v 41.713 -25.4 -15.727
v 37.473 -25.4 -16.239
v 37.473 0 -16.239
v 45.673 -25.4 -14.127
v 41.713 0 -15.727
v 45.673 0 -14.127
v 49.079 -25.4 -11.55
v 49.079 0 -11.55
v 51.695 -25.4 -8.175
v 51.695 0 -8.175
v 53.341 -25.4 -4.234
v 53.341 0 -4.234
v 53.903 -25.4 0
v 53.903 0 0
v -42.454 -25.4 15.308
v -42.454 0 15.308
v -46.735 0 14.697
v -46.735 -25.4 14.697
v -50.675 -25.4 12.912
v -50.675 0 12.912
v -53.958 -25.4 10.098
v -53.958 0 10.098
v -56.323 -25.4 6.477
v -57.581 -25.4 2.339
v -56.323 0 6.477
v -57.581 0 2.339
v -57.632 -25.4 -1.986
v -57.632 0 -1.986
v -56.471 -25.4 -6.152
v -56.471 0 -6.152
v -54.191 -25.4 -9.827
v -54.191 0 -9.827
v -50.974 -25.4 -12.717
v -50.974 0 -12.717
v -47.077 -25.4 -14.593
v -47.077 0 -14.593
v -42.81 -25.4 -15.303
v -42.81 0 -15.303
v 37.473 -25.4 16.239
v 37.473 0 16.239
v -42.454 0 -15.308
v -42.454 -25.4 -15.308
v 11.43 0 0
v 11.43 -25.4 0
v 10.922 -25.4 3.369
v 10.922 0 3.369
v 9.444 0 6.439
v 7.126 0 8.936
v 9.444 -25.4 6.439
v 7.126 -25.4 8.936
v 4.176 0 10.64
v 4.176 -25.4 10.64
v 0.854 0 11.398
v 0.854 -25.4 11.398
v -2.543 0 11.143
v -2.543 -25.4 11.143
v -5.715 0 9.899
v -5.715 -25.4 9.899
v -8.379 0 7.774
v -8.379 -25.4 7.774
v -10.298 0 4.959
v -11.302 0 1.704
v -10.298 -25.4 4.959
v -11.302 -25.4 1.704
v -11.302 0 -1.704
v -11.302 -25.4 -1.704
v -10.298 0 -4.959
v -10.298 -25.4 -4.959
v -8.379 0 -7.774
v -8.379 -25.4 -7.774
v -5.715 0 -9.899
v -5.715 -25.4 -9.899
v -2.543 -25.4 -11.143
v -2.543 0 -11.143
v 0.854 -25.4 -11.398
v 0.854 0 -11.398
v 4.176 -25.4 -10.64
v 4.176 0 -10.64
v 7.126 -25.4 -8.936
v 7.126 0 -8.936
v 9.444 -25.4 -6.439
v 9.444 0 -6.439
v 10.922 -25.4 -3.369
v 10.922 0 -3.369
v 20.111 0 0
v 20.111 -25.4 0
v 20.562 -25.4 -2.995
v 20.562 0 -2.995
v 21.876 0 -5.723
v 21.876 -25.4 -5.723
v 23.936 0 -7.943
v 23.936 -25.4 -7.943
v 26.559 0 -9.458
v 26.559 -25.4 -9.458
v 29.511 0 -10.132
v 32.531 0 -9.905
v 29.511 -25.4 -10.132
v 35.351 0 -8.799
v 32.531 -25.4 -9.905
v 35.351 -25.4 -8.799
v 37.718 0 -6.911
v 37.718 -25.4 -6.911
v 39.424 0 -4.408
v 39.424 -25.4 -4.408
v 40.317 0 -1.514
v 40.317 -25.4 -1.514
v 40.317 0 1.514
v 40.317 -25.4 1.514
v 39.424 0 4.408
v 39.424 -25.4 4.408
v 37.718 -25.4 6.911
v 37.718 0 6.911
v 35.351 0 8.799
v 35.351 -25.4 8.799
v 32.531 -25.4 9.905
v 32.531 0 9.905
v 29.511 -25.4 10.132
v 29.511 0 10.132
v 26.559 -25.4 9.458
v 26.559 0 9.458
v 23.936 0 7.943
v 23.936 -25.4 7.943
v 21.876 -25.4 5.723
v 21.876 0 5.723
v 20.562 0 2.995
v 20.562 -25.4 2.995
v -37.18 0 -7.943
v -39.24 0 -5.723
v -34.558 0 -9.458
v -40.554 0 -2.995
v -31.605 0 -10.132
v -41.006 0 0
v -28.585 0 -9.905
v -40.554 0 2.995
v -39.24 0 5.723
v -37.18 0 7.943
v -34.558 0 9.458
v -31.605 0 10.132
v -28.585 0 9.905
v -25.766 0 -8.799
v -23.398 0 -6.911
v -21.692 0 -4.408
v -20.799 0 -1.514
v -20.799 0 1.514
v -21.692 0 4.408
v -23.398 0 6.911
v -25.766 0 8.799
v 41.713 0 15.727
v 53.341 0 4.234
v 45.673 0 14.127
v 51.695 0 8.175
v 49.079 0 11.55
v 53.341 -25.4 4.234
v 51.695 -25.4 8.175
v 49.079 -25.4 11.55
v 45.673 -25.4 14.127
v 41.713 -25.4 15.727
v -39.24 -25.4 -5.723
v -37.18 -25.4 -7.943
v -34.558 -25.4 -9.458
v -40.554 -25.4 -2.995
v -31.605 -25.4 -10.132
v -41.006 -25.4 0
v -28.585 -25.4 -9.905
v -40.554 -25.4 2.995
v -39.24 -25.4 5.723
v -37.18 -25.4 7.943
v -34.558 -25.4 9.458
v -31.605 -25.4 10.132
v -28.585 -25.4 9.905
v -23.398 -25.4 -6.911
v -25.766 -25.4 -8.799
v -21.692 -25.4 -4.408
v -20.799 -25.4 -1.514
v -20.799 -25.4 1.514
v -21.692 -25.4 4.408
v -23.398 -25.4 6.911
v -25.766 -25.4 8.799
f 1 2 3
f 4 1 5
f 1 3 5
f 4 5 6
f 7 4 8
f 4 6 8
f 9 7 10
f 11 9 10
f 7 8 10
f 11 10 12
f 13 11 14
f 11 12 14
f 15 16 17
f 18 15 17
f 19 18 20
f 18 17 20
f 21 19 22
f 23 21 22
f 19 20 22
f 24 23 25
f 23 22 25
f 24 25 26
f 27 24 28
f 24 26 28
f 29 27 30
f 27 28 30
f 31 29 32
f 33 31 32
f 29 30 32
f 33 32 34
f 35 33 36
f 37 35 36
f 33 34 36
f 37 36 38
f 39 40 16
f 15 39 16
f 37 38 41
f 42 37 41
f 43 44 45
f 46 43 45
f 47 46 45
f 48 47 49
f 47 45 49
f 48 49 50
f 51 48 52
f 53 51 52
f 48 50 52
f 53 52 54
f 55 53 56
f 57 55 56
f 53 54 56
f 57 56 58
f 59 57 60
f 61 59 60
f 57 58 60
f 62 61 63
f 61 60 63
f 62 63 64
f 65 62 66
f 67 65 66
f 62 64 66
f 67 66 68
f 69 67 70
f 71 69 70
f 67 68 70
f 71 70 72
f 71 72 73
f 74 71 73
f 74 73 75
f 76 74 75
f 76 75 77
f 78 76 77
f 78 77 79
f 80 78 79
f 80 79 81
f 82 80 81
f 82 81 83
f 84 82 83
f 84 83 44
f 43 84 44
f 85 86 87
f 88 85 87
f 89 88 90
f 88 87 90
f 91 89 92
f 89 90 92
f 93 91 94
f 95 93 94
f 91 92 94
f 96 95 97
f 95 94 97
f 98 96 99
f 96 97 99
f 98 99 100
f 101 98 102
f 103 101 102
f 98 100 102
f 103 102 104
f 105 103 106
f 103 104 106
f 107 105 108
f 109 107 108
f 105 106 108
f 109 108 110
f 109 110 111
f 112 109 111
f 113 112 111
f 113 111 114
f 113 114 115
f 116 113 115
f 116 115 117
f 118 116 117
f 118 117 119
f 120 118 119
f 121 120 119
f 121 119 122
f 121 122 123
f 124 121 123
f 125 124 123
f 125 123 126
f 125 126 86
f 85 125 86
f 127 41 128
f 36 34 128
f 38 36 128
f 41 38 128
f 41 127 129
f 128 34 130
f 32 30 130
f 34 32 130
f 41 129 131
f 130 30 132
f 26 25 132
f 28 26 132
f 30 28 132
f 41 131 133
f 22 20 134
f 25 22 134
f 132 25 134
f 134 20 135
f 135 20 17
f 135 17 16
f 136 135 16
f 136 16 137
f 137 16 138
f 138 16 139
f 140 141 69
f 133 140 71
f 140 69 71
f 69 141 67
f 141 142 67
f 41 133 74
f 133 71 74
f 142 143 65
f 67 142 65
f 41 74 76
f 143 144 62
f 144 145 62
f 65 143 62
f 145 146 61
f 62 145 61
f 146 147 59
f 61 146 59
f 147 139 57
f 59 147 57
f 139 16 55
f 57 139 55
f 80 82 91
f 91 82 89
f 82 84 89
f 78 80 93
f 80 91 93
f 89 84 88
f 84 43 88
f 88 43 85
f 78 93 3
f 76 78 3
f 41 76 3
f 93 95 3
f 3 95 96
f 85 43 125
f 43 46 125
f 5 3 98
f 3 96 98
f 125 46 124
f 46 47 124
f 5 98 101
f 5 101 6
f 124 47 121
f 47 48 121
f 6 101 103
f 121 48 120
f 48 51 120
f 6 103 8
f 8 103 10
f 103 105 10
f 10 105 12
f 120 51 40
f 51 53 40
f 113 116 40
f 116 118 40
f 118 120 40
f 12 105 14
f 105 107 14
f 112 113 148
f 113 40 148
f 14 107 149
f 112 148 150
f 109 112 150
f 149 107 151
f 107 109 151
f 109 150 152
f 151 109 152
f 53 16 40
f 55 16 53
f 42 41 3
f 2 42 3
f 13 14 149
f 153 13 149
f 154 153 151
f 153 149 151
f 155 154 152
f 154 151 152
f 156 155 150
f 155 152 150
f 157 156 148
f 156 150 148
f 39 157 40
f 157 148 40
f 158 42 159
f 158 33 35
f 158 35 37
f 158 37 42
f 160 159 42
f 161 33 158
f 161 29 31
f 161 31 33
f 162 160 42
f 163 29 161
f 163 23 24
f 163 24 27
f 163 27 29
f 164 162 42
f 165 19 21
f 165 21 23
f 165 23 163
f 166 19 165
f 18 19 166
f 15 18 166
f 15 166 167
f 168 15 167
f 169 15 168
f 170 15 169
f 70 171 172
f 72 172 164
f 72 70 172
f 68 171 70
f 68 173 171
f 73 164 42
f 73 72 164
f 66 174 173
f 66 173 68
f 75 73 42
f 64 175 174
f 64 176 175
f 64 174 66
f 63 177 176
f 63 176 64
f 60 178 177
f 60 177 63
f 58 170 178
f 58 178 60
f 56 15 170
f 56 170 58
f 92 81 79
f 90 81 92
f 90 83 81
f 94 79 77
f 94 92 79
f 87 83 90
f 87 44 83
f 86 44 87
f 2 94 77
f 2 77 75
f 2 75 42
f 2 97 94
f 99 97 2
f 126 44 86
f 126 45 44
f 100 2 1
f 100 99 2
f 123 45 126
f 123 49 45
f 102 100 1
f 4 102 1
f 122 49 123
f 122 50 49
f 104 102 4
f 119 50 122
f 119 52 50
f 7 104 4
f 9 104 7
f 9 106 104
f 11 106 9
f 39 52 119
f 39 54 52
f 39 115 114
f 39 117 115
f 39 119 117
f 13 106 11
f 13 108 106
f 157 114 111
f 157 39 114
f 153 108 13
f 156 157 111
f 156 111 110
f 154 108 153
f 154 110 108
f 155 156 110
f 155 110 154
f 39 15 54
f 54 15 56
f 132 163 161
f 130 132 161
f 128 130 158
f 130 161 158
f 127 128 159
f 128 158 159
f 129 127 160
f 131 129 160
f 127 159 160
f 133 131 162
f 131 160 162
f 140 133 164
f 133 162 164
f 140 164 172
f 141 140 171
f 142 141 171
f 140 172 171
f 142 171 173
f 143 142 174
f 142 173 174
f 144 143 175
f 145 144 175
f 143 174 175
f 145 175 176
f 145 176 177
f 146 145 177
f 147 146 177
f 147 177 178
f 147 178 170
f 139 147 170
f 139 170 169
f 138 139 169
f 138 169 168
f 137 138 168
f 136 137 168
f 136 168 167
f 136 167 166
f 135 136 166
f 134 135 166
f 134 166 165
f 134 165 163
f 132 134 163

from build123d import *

# Parameters (mm, degrees)
F1_DEPTH = 25.4
F3_D     = 20.32
F5_D     = 22.86


with BuildPart() as f1:
    # F0 (on Front) → F1 (new body)
    with BuildSketch(Plane.XZ):
        with BuildLine():
            Line((37.473018, -16.239311), (37.473018, 16.239311))
            ThreePointArc((37.473018, 16.239311), (21.421916, 0), (37.473018, -16.239311))
        make_face()
        with BuildLine():
            ThreePointArc((53.902746, 0), (49.07891, 11.550446), (37.473018, 16.239311))
            Line((37.473018, 16.239311), (37.473018, -16.239311))
            ThreePointArc((37.473018, -16.239311), (49.07891, -11.550446), (53.902746, 0))
        make_face()
        with BuildLine():
            ThreePointArc((-42.453576, 15.307551), (-31.629503, 10.824073), (-27.146025, 0))
            ThreePointArc((-27.146025, 0), (-31.629503, -10.824073), (-42.453576, -15.307551))
            Line((-42.453576, -15.307551), (37.473018, -16.239311))
            ThreePointArc((37.473018, -16.239311), (21.421916, 0), (37.473018, 16.239311))
            Line((37.473018, 16.239311), (-42.453576, 15.307551))
        make_face()
        with BuildLine():
            ThreePointArc((-42.453576, -15.307551), (-31.629503, -10.824073), (-27.146025, 0))
            ThreePointArc((-27.146025, 0), (-31.629503, 10.824073), (-42.453576, 15.307551))
            Line((-42.453576, 15.307551), (-42.810429, -15.303391))
            Line((-42.810429, -15.303391), (-42.453576, -15.307551))
        make_face()
        with BuildLine():
            Line((-42.810429, -15.303391), (-42.453576, 15.307551))
            ThreePointArc((-42.453576, 15.307551), (-57.760087, 0.178439), (-42.810429, -15.303391))
        make_face()
    extrude(amount=F1_DEPTH)

    # F3 (through all)
    with Locations(Plane(origin=(0, 0, 0), x_dir=(1, 0, 0), z_dir=(0, 1, 0))):
        with Locations((-30.845791, 0), (30.270591, 0)):
            Hole(F3_D / 2)

    # F5 (through all)
    with Locations(Plane(origin=(0, 0, 0), x_dir=(-1, 0, 0), z_dir=(0, 1, 0))):
        with Locations((0, 0)):
            Hole(F5_D / 2)


solid = f1.part
